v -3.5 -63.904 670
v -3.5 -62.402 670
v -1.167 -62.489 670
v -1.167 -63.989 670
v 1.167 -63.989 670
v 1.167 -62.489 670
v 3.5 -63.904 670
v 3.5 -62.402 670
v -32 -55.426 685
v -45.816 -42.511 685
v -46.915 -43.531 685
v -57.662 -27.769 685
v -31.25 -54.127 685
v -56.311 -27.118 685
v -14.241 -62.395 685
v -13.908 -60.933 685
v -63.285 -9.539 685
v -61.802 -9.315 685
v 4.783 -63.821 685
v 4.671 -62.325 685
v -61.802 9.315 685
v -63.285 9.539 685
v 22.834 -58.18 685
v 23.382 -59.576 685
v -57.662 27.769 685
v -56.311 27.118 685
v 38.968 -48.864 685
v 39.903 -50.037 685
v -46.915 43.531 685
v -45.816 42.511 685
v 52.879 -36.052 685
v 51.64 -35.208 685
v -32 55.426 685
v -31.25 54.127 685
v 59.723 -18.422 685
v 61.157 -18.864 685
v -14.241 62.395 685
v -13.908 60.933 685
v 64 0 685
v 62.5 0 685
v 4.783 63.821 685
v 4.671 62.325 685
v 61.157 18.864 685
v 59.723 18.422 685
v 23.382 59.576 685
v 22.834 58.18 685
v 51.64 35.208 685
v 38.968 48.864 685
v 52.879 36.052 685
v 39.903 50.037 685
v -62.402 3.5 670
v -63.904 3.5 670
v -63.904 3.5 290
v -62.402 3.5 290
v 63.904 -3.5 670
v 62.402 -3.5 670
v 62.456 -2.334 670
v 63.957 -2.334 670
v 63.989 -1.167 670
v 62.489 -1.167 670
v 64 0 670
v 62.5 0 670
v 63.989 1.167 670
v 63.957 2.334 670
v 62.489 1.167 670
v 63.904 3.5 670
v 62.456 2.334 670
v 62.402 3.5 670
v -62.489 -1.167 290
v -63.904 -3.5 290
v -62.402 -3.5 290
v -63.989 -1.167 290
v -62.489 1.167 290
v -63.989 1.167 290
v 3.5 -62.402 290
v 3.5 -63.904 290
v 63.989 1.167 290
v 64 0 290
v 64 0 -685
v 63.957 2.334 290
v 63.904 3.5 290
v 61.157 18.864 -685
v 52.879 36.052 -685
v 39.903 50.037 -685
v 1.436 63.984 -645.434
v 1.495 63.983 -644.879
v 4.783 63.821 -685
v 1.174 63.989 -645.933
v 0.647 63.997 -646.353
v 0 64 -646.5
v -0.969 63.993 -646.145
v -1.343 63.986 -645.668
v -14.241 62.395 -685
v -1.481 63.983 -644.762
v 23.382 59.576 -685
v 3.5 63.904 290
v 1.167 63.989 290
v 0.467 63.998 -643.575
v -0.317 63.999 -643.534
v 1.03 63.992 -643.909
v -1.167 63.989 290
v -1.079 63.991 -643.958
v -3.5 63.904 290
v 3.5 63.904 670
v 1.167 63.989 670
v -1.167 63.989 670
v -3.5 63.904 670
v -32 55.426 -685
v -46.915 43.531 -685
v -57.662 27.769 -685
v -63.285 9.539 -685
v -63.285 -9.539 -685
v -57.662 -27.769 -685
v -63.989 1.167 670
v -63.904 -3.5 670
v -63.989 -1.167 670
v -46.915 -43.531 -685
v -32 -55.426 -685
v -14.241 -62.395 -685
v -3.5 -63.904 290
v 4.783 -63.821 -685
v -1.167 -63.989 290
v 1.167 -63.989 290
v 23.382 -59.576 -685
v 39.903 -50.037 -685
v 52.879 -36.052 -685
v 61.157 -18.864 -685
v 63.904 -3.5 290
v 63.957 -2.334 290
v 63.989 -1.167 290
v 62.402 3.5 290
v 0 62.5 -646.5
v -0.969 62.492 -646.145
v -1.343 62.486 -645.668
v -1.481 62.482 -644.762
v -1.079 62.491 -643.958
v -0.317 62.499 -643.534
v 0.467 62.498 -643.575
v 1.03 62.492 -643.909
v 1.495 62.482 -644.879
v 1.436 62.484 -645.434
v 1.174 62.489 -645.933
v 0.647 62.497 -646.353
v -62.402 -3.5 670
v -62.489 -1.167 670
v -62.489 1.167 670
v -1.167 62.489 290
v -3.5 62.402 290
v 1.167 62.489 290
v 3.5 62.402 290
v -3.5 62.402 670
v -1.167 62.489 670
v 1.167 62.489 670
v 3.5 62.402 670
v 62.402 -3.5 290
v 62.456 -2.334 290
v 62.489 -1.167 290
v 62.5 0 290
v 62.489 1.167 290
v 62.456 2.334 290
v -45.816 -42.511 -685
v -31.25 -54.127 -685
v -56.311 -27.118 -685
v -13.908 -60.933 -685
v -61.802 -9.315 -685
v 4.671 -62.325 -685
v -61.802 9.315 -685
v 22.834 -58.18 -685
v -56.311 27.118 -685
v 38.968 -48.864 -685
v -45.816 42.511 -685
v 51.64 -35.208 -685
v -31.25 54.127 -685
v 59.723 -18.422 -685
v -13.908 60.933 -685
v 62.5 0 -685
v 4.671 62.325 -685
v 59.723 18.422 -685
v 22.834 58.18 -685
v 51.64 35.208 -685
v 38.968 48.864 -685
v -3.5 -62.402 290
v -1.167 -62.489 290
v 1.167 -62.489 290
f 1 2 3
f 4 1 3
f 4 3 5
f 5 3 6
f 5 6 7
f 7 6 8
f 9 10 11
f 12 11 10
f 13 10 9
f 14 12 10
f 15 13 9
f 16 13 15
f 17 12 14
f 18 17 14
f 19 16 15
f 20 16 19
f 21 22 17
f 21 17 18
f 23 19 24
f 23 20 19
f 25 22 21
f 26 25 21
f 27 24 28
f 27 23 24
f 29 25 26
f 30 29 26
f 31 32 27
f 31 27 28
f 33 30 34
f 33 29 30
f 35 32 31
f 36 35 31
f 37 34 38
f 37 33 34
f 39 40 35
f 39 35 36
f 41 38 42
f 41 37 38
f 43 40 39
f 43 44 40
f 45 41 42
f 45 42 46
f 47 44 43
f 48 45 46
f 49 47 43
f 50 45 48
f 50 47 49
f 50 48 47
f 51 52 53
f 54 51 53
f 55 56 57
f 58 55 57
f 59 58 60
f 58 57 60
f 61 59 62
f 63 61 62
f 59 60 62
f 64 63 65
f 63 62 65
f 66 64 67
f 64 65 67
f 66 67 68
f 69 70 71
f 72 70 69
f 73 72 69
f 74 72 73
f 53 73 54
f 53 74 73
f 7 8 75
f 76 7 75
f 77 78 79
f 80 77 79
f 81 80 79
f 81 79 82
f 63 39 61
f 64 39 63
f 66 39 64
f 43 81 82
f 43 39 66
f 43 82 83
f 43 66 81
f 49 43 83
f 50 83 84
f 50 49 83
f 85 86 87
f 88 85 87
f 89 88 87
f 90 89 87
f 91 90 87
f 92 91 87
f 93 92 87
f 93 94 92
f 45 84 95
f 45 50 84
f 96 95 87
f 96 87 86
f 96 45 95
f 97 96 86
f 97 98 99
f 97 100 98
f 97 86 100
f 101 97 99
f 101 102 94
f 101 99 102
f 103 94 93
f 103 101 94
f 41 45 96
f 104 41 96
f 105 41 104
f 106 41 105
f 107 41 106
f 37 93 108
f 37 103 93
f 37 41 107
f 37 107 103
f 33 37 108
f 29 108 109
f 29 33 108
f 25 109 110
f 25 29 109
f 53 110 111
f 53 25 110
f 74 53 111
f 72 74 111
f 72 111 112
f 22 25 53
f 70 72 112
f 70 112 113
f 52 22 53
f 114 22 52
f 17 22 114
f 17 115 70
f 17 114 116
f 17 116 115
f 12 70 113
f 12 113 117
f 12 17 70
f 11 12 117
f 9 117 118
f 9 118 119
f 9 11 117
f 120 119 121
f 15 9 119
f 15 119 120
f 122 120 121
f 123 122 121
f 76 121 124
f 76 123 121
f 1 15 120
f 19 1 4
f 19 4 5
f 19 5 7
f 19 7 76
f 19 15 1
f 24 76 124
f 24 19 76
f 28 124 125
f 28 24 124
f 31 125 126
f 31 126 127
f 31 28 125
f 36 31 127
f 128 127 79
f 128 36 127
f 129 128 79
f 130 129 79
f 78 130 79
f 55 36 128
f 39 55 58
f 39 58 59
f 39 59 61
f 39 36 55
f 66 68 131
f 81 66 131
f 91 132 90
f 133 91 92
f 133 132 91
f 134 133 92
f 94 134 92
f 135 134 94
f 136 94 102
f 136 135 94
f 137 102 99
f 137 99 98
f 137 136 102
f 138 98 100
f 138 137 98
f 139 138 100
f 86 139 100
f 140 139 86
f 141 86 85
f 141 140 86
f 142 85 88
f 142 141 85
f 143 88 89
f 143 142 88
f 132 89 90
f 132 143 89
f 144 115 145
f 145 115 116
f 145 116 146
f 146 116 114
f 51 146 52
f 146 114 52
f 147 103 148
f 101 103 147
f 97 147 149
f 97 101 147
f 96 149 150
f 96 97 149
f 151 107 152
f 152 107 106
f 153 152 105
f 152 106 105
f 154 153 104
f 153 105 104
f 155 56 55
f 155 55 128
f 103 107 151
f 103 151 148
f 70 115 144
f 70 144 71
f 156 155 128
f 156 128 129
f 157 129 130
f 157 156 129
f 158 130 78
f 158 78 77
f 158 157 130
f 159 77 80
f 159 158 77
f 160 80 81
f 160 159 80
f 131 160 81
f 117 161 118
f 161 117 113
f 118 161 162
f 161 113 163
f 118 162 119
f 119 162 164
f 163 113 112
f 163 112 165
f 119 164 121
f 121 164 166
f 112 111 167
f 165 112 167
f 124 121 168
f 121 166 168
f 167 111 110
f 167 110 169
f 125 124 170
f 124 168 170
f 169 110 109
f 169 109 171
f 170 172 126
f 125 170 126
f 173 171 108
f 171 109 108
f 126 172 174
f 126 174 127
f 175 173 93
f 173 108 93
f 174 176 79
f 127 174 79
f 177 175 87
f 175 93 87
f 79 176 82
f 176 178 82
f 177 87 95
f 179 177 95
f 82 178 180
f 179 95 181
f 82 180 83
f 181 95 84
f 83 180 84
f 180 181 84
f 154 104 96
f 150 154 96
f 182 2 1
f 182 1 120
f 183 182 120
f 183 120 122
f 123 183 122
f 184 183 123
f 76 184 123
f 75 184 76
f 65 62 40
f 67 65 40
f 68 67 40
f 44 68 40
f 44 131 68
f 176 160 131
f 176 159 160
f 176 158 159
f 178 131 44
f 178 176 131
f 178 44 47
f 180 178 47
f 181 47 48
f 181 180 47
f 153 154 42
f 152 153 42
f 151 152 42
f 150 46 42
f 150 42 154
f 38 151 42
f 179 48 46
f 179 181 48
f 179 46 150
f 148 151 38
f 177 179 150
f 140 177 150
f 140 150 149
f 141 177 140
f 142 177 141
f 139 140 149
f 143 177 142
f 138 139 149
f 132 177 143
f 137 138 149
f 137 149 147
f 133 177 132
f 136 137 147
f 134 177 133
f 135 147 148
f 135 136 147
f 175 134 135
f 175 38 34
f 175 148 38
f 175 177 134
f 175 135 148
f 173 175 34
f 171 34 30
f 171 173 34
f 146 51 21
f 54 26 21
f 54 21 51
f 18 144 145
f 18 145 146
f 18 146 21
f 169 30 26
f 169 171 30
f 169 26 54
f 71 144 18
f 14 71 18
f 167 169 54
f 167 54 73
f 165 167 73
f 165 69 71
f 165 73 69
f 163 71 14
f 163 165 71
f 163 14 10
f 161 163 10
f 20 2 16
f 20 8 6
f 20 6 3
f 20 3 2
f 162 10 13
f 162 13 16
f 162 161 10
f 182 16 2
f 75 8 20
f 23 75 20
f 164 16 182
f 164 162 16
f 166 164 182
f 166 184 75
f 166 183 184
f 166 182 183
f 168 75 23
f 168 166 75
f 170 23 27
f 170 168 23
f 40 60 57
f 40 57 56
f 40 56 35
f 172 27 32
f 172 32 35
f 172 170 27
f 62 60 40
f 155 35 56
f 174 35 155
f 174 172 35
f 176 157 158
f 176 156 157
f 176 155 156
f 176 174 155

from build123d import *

# Parameters (mm, degrees)
SKETCH1_R           = 64
SKETCH1_R_2         = 62.5
BOSS_EXTRUDE1_DEPTH = 685
SKETCH2_W           = 7
SKETCH2_H           = 380
CUT_EXTRUDE1_DEPTH  = 75
CIRPATTERN1_COUNT   = 4
SKETCH3_R           = 1.5
CUT_EXTRUDE2_DEPTH  = 691.953688752


with BuildPart() as part:
    # Sketch1 → Boss-Extrude1 (new, symmetric)
    with BuildSketch(Plane.XY):
        Circle(SKETCH1_R)
        Circle(SKETCH1_R_2, mode=Mode.SUBTRACT)
    extrude(amount=BOSS_EXTRUDE1_DEPTH, both=True)

    # Sketch2 → Cut-Extrude1 (cut, symmetric)
    with BuildSketch(Plane(origin=(0, 0, 0), x_dir=(1, 0, 0), z_dir=(0, 1, 0))):
        with Locations((0, -480)):
            Rectangle(SKETCH2_W, SKETCH2_H)
    cut_extrude1 = extrude(amount=CUT_EXTRUDE1_DEPTH, both=True, mode=Mode.SUBTRACT)

    # CirPattern1: Cut-Extrude1 ×4 about axis
    cirpattern1_axis = Axis((0, 0, 685), (0, 0, 1))
    for i in range(1, CIRPATTERN1_COUNT):
        add(cut_extrude1.rotate(cirpattern1_axis, i * 360 / CIRPATTERN1_COUNT), mode=Mode.SUBTRACT)

    # Sketch3 → Cut-Extrude2 (cut, through all)
    with BuildSketch(Plane(origin=(0, 0, 0), x_dir=(1, 0, 0), z_dir=(0, 1, 0))):
        with Locations(Location((0, 645, 0), (0, 0, 90))):
            Circle(SKETCH3_R)
    extrude(amount=CUT_EXTRUDE2_DEPTH, mode=Mode.SUBTRACT)


solid = part.part
